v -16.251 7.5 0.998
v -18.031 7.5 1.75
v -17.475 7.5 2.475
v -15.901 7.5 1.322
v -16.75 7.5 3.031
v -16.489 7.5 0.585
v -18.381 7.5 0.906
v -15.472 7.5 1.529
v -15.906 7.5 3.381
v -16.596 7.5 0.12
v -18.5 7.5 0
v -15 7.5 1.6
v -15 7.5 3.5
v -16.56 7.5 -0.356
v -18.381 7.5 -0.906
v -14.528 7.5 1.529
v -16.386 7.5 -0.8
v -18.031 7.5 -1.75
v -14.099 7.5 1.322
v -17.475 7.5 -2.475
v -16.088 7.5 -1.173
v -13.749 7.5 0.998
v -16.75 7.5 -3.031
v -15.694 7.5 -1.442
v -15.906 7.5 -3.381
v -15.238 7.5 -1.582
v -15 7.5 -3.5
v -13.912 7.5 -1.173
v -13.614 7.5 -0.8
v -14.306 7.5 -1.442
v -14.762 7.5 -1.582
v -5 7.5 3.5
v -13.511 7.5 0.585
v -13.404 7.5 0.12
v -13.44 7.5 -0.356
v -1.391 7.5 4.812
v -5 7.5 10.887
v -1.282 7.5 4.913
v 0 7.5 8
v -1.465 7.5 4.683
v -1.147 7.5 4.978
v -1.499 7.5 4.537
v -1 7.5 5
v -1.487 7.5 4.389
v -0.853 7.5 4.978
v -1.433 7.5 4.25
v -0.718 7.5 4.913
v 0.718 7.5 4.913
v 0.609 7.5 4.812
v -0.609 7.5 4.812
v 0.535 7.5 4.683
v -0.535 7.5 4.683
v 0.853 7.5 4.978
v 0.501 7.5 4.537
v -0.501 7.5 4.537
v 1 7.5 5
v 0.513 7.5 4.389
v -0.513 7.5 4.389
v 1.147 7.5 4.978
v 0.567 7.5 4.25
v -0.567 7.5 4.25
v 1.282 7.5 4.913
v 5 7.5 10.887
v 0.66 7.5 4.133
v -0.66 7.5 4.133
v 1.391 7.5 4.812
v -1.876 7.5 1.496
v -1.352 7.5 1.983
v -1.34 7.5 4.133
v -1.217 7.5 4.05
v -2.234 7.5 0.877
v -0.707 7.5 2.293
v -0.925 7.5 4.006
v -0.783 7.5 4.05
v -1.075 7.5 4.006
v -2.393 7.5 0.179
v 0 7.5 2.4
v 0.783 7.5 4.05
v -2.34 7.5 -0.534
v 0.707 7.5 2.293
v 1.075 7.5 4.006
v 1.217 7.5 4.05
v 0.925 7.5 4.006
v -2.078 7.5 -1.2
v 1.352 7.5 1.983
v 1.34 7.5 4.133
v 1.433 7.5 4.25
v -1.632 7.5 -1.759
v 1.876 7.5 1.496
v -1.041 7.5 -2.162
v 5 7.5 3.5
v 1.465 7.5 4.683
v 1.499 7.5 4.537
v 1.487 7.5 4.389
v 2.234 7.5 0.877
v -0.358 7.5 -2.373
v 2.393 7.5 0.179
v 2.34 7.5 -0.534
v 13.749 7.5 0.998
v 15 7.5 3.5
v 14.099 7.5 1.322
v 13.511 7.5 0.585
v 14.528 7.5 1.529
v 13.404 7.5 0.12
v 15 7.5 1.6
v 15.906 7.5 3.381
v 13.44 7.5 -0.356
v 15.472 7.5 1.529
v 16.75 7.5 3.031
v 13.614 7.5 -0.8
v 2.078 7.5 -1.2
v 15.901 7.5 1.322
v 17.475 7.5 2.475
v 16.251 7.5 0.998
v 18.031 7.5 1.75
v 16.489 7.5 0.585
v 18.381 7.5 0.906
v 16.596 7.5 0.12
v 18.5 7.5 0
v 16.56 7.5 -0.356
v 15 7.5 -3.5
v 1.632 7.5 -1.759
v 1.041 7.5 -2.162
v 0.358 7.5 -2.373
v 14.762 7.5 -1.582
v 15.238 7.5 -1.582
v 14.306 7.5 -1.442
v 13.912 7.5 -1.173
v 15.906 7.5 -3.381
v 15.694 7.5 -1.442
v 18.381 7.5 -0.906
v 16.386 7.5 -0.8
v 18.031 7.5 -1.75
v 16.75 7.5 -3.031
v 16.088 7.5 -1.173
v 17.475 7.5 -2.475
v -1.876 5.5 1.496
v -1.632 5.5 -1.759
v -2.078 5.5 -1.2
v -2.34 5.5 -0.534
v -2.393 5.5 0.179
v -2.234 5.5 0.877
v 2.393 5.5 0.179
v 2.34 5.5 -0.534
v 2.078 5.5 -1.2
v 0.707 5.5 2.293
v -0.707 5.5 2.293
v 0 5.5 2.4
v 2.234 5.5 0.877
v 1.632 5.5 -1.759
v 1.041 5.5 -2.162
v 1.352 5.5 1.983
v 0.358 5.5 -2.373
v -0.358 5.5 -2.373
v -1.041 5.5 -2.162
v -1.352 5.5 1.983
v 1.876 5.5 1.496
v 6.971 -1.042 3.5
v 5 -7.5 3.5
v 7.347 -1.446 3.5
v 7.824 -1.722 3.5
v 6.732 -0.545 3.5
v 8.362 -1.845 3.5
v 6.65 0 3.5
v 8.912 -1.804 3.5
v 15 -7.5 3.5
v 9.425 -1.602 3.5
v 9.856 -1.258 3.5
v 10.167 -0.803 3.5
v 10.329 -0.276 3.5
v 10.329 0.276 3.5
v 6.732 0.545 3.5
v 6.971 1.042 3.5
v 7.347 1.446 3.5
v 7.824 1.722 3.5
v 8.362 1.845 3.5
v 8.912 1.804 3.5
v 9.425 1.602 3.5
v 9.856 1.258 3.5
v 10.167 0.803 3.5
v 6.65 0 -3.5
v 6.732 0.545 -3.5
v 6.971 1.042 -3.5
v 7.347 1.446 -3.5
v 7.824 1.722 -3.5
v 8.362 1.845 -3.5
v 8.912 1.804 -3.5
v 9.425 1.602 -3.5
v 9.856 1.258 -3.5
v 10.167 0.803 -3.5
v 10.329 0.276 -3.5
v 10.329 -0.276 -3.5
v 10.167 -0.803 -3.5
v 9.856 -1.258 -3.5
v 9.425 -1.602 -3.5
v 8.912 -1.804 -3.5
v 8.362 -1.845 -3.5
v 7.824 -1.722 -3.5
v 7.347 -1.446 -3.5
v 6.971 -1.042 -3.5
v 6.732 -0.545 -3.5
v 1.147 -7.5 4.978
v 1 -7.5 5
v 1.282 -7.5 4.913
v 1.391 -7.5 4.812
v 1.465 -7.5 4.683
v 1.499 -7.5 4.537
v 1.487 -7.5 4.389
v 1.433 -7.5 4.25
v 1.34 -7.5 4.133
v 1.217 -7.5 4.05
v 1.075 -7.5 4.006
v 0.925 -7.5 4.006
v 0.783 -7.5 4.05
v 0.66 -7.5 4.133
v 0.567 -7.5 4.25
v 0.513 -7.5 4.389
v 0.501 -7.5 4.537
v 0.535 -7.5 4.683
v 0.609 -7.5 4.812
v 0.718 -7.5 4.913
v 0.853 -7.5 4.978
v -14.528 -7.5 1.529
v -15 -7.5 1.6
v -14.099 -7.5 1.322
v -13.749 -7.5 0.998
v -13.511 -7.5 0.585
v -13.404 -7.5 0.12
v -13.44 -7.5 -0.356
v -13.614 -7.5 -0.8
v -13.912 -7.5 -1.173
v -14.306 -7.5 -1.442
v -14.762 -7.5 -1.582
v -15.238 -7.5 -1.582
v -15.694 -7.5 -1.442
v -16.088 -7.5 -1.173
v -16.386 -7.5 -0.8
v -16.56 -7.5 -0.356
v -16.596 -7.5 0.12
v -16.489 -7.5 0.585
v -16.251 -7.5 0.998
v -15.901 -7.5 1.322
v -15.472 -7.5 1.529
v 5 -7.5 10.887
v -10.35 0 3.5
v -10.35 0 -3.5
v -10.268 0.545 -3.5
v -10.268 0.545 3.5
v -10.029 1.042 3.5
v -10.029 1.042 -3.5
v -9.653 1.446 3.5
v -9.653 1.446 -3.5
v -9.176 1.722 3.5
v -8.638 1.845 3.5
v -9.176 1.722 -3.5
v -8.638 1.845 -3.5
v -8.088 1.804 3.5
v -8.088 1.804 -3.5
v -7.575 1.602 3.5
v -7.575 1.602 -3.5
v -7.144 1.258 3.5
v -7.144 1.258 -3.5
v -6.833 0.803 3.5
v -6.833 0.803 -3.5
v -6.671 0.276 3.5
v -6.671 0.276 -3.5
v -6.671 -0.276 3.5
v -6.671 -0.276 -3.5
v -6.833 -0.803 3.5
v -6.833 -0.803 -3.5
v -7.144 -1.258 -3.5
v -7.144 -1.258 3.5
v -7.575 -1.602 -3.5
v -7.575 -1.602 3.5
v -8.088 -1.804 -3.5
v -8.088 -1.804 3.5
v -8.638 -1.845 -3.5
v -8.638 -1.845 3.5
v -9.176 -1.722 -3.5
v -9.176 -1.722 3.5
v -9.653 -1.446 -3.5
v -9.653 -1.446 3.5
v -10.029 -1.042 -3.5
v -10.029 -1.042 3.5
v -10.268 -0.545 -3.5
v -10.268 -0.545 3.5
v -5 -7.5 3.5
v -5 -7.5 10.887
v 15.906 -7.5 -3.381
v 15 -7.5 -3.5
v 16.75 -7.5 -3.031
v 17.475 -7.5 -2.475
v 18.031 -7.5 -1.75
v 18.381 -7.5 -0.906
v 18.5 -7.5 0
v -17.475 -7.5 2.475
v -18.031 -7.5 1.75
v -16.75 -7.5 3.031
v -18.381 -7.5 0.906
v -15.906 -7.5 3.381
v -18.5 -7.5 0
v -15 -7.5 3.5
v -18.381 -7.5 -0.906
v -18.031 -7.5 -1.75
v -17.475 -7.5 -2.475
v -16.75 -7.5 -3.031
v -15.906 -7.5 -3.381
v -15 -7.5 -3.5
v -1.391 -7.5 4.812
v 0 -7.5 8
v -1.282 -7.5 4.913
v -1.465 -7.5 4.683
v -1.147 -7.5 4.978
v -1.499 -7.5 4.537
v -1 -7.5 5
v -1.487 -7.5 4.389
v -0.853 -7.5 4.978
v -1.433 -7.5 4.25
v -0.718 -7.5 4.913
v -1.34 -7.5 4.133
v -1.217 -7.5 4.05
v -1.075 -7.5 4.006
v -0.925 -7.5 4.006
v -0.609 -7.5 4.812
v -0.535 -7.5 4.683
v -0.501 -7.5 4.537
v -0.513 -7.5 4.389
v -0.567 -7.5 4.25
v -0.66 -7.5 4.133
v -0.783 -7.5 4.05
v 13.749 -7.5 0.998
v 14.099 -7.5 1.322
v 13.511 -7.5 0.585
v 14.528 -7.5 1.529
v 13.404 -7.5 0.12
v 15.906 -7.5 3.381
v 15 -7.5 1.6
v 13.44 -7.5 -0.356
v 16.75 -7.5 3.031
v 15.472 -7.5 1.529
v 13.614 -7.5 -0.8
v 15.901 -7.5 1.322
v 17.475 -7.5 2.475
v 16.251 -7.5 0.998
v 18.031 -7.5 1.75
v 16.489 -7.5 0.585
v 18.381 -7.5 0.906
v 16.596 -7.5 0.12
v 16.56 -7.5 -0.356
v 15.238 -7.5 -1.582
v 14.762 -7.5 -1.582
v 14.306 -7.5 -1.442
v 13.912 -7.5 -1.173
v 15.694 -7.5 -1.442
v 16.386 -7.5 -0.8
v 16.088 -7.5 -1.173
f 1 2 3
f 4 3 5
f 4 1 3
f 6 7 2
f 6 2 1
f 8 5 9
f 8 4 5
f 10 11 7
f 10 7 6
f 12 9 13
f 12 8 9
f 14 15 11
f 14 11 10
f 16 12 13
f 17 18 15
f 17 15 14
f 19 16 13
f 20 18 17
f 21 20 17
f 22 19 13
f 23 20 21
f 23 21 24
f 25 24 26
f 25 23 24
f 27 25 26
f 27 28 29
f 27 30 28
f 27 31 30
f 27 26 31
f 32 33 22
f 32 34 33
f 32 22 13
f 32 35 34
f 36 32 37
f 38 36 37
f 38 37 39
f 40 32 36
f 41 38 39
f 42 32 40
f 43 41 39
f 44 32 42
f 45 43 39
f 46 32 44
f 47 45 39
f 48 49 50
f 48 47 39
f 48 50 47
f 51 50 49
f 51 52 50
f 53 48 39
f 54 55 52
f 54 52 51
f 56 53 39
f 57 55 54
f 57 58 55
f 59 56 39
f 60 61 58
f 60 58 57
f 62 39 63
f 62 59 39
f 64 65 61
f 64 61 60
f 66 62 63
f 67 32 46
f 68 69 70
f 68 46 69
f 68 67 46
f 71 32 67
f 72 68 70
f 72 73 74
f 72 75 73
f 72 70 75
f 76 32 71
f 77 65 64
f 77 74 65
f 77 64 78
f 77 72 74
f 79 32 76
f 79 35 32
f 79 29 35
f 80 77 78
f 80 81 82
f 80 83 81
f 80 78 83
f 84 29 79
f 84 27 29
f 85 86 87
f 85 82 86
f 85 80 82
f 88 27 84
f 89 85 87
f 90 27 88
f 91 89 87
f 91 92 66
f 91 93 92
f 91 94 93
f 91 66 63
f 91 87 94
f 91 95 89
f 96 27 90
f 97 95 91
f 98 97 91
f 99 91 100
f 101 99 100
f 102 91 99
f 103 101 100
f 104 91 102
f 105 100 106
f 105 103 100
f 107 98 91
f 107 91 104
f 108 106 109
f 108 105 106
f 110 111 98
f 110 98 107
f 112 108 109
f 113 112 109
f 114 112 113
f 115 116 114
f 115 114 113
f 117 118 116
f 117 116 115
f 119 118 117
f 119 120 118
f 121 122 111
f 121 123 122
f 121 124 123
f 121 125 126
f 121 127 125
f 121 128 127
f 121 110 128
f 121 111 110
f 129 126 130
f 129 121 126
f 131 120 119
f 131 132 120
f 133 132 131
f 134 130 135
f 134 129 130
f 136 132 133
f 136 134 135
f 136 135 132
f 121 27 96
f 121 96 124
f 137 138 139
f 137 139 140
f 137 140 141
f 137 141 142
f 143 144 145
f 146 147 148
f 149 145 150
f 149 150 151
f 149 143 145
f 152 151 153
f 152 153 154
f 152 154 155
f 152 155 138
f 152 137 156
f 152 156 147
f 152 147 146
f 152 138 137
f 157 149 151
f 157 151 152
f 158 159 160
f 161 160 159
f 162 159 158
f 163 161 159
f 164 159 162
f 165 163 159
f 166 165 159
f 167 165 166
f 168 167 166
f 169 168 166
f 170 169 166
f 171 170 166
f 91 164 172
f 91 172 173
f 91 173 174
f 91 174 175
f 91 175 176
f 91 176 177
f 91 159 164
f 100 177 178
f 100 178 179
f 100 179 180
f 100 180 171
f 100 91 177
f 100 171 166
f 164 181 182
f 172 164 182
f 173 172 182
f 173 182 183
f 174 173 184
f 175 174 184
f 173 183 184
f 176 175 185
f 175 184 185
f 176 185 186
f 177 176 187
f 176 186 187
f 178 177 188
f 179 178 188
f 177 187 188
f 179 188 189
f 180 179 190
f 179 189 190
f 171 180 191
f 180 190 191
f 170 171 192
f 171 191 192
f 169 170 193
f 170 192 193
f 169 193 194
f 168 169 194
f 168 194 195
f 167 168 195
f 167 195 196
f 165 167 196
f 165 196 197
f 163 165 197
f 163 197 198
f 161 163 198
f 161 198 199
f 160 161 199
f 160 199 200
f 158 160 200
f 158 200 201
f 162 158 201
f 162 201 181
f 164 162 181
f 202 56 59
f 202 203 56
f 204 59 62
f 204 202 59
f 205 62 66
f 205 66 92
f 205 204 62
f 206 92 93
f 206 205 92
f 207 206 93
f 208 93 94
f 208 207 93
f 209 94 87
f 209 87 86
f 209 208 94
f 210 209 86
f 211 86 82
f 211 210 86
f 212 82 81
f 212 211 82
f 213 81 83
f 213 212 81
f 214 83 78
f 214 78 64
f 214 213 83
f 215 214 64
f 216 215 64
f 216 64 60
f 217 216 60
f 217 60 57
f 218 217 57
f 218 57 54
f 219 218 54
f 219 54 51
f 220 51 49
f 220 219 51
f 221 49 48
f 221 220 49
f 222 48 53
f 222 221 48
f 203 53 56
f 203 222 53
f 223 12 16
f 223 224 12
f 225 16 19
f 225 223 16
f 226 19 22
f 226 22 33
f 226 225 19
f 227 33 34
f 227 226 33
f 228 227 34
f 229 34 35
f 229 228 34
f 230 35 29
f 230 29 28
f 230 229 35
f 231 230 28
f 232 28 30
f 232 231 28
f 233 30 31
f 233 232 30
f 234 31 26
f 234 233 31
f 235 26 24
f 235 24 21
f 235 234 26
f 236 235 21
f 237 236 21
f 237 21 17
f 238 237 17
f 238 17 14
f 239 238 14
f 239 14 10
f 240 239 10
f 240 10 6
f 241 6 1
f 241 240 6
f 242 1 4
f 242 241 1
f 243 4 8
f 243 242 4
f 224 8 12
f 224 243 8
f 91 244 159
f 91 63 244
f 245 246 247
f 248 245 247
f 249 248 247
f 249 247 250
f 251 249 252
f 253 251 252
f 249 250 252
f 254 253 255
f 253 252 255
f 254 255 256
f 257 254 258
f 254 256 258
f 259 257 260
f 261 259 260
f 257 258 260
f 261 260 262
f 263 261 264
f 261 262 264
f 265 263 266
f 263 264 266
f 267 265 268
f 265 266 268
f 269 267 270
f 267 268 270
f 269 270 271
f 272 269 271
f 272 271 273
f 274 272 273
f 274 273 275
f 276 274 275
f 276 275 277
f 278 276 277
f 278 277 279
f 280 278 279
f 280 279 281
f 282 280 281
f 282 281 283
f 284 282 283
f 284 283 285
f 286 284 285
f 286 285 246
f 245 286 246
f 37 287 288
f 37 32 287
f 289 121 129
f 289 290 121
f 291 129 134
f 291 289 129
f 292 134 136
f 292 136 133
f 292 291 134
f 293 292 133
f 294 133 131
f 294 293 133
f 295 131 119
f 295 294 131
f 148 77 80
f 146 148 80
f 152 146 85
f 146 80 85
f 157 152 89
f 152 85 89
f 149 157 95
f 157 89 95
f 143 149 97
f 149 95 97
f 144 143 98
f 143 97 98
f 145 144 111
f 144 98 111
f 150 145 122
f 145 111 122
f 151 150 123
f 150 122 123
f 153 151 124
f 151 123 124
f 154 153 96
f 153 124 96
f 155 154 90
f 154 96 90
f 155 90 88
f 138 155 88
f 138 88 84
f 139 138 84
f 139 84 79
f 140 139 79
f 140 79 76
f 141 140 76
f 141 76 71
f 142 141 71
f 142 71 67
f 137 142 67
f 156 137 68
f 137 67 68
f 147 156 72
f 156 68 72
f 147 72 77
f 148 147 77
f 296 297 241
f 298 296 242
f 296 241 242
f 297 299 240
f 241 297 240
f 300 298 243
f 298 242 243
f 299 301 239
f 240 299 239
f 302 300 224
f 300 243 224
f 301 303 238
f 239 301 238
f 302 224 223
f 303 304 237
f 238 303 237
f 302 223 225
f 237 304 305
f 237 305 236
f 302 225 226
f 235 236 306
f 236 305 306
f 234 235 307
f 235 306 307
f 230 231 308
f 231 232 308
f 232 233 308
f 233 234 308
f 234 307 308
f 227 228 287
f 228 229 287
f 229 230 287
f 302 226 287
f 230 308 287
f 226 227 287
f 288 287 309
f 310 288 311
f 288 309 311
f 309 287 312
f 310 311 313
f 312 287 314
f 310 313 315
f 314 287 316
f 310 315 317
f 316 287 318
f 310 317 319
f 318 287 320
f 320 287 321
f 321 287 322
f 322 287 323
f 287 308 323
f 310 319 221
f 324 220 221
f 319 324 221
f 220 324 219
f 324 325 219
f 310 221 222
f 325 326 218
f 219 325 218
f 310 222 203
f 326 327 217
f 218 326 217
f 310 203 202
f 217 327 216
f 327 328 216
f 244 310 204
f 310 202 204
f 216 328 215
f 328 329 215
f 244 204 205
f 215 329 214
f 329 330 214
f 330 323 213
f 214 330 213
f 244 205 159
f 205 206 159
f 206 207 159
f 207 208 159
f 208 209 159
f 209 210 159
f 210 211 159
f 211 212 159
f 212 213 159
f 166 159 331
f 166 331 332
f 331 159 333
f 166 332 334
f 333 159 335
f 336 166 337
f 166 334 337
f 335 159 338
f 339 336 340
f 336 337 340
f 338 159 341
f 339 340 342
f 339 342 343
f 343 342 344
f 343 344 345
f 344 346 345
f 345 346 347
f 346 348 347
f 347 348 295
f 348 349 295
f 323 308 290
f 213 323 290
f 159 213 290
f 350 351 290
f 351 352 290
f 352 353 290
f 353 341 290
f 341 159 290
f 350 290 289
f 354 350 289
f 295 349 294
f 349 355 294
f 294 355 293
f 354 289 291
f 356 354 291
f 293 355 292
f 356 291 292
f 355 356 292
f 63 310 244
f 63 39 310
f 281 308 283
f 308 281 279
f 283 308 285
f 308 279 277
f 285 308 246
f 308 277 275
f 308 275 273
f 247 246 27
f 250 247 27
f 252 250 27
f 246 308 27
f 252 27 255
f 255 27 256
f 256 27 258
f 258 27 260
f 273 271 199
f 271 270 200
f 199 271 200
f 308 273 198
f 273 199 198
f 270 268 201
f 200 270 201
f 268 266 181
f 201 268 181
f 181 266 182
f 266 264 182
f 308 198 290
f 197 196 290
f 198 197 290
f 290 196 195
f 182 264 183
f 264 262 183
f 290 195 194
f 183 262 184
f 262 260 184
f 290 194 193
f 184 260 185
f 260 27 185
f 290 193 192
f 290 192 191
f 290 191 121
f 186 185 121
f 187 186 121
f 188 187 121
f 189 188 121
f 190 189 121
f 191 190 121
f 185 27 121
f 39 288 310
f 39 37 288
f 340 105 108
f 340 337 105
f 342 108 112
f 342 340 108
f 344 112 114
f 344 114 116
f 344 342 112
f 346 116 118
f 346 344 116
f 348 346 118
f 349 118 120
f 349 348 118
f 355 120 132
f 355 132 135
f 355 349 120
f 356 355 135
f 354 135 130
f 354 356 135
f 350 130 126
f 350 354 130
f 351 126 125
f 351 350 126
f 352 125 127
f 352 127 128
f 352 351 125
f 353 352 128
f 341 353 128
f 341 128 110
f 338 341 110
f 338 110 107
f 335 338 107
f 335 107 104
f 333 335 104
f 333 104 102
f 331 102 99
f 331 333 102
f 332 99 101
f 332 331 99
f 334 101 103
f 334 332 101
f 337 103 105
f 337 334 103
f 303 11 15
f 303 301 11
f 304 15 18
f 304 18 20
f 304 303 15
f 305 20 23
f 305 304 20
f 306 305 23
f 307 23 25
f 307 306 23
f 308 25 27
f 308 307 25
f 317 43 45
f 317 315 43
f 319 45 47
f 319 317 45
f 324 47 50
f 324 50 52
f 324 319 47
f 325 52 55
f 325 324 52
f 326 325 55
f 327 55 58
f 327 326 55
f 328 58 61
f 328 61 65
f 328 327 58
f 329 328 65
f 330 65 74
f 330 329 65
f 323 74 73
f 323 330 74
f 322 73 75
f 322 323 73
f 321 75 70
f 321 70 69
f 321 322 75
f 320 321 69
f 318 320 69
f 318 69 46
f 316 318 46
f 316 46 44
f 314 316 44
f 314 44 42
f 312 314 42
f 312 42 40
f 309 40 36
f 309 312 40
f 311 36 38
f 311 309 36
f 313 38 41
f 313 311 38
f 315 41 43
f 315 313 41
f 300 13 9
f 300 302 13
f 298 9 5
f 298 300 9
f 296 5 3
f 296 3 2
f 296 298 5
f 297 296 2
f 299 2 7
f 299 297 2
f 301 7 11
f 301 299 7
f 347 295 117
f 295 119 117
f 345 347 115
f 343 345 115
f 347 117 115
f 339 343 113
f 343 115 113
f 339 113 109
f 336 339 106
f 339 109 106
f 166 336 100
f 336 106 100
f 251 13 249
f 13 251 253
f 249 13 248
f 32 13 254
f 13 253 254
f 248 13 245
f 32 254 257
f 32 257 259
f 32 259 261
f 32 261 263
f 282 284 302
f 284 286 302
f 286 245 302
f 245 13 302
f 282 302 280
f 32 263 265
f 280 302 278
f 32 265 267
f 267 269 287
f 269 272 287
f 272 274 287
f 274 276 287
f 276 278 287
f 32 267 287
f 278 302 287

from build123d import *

# Parameters (mm, degrees)
SKIZZE1_W                       = 37
SKIZZE1_H                       = 7
SKIZZE1_R                       = 2.4
SKIZZE1_R_2                     = 1.6
SKIZZE1_R_3                     = 0.5
AUFSATZ_LINEAR_AUSTRAGEN1_DEPTH = 7.5
VERRUNDUNG1_R                   = 3.5
SKIZZE2_R                       = 1.85
SCHNITT_LINEAR_AUSTRAGEN1_DEPTH = 25.606475048
SKIZZE3_R                       = 2.4
SCHNITT_LINEAR_AUSTRAGEN2_DEPTH = 2


with BuildPart() as part:
    # Skizze1 → Aufsatz-Linear austragen1 (new, symmetric)
    # profile 1 of 3: a face of its own
    with BuildSketch(Plane(origin=(0, 0, 0), x_dir=(1, 0, 0), z_dir=(0, 1, 0))):
        Rectangle(SKIZZE1_W, SKIZZE1_H)
        Circle(SKIZZE1_R, mode=Mode.SUBTRACT)
        with Locations(Location((15, 0, 0), (0, 0, 270))):
            Circle(SKIZZE1_R_2, mode=Mode.SUBTRACT)
        with Locations(Location((-15, 0, 0), (0, 0, 270))):
            Circle(SKIZZE1_R_2, mode=Mode.SUBTRACT)
    # profile 2 of 3: a face of its own
    with BuildSketch(Plane(origin=(0, 0, 0), x_dir=(1, 0, 0), z_dir=(0, 1, 0))):
        Circle(SKIZZE1_R)
    # profile 3 of 3: a face of its own
    with BuildSketch(Plane(origin=(0, 0, 0), x_dir=(1, 0, 0), z_dir=(0, 1, 0))):
        Polygon((5, -3.5), (-5, -3.5), (-5, -10.886751346), (0, -8), (5, -10.886751346), align=None)
        with Locations(Location((-1, -4.5, 0), (0, 0, 270))):
            Circle(SKIZZE1_R_3, mode=Mode.SUBTRACT)
        with Locations(Location((1, -4.5, 0), (0, 0, 270))):
            Circle(SKIZZE1_R_3, mode=Mode.SUBTRACT)
    extrude(amount=AUFSATZ_LINEAR_AUSTRAGEN1_DEPTH, both=True)

    # Verrundung1
    verrundung1_edges = [part.edges().sort_by_distance(p)[0] for p in [
        (-18.5, 0, 3.5),
        (-18.5, 0, -3.5),
        (18.5, 0, -3.5),
        (18.5, 0, 3.5),
    ]]
    fillet(verrundung1_edges, radius=VERRUNDUNG1_R - 0.0001)  # a hair under: the kernel refuses the full size

    # Skizze2 → Schnitt-Linear austragen1 (cut, through all)
    with BuildSketch(Plane(origin=(0, 0, -3.5), x_dir=(-1, 0, 0), z_dir=(0, 0, -1))):
        with Locations((-8.5, 0)):
            Circle(SKIZZE2_R)
        with Locations((8.5, 0)):
            Circle(SKIZZE2_R)
    extrude(amount=-SCHNITT_LINEAR_AUSTRAGEN1_DEPTH, mode=Mode.SUBTRACT)

    # Skizze3 → Schnitt-Linear austragen2 (cut)
    with BuildSketch(Plane(origin=(0, 7.5, 0), x_dir=(1, 0, 0), z_dir=(0, 1, 0))):
        with Locations(Location((0, 0, 0), (0, 0, 270))):
            Circle(SKIZZE3_R)
    extrude(amount=-SCHNITT_LINEAR_AUSTRAGEN2_DEPTH, mode=Mode.SUBTRACT)


solid = part.part
